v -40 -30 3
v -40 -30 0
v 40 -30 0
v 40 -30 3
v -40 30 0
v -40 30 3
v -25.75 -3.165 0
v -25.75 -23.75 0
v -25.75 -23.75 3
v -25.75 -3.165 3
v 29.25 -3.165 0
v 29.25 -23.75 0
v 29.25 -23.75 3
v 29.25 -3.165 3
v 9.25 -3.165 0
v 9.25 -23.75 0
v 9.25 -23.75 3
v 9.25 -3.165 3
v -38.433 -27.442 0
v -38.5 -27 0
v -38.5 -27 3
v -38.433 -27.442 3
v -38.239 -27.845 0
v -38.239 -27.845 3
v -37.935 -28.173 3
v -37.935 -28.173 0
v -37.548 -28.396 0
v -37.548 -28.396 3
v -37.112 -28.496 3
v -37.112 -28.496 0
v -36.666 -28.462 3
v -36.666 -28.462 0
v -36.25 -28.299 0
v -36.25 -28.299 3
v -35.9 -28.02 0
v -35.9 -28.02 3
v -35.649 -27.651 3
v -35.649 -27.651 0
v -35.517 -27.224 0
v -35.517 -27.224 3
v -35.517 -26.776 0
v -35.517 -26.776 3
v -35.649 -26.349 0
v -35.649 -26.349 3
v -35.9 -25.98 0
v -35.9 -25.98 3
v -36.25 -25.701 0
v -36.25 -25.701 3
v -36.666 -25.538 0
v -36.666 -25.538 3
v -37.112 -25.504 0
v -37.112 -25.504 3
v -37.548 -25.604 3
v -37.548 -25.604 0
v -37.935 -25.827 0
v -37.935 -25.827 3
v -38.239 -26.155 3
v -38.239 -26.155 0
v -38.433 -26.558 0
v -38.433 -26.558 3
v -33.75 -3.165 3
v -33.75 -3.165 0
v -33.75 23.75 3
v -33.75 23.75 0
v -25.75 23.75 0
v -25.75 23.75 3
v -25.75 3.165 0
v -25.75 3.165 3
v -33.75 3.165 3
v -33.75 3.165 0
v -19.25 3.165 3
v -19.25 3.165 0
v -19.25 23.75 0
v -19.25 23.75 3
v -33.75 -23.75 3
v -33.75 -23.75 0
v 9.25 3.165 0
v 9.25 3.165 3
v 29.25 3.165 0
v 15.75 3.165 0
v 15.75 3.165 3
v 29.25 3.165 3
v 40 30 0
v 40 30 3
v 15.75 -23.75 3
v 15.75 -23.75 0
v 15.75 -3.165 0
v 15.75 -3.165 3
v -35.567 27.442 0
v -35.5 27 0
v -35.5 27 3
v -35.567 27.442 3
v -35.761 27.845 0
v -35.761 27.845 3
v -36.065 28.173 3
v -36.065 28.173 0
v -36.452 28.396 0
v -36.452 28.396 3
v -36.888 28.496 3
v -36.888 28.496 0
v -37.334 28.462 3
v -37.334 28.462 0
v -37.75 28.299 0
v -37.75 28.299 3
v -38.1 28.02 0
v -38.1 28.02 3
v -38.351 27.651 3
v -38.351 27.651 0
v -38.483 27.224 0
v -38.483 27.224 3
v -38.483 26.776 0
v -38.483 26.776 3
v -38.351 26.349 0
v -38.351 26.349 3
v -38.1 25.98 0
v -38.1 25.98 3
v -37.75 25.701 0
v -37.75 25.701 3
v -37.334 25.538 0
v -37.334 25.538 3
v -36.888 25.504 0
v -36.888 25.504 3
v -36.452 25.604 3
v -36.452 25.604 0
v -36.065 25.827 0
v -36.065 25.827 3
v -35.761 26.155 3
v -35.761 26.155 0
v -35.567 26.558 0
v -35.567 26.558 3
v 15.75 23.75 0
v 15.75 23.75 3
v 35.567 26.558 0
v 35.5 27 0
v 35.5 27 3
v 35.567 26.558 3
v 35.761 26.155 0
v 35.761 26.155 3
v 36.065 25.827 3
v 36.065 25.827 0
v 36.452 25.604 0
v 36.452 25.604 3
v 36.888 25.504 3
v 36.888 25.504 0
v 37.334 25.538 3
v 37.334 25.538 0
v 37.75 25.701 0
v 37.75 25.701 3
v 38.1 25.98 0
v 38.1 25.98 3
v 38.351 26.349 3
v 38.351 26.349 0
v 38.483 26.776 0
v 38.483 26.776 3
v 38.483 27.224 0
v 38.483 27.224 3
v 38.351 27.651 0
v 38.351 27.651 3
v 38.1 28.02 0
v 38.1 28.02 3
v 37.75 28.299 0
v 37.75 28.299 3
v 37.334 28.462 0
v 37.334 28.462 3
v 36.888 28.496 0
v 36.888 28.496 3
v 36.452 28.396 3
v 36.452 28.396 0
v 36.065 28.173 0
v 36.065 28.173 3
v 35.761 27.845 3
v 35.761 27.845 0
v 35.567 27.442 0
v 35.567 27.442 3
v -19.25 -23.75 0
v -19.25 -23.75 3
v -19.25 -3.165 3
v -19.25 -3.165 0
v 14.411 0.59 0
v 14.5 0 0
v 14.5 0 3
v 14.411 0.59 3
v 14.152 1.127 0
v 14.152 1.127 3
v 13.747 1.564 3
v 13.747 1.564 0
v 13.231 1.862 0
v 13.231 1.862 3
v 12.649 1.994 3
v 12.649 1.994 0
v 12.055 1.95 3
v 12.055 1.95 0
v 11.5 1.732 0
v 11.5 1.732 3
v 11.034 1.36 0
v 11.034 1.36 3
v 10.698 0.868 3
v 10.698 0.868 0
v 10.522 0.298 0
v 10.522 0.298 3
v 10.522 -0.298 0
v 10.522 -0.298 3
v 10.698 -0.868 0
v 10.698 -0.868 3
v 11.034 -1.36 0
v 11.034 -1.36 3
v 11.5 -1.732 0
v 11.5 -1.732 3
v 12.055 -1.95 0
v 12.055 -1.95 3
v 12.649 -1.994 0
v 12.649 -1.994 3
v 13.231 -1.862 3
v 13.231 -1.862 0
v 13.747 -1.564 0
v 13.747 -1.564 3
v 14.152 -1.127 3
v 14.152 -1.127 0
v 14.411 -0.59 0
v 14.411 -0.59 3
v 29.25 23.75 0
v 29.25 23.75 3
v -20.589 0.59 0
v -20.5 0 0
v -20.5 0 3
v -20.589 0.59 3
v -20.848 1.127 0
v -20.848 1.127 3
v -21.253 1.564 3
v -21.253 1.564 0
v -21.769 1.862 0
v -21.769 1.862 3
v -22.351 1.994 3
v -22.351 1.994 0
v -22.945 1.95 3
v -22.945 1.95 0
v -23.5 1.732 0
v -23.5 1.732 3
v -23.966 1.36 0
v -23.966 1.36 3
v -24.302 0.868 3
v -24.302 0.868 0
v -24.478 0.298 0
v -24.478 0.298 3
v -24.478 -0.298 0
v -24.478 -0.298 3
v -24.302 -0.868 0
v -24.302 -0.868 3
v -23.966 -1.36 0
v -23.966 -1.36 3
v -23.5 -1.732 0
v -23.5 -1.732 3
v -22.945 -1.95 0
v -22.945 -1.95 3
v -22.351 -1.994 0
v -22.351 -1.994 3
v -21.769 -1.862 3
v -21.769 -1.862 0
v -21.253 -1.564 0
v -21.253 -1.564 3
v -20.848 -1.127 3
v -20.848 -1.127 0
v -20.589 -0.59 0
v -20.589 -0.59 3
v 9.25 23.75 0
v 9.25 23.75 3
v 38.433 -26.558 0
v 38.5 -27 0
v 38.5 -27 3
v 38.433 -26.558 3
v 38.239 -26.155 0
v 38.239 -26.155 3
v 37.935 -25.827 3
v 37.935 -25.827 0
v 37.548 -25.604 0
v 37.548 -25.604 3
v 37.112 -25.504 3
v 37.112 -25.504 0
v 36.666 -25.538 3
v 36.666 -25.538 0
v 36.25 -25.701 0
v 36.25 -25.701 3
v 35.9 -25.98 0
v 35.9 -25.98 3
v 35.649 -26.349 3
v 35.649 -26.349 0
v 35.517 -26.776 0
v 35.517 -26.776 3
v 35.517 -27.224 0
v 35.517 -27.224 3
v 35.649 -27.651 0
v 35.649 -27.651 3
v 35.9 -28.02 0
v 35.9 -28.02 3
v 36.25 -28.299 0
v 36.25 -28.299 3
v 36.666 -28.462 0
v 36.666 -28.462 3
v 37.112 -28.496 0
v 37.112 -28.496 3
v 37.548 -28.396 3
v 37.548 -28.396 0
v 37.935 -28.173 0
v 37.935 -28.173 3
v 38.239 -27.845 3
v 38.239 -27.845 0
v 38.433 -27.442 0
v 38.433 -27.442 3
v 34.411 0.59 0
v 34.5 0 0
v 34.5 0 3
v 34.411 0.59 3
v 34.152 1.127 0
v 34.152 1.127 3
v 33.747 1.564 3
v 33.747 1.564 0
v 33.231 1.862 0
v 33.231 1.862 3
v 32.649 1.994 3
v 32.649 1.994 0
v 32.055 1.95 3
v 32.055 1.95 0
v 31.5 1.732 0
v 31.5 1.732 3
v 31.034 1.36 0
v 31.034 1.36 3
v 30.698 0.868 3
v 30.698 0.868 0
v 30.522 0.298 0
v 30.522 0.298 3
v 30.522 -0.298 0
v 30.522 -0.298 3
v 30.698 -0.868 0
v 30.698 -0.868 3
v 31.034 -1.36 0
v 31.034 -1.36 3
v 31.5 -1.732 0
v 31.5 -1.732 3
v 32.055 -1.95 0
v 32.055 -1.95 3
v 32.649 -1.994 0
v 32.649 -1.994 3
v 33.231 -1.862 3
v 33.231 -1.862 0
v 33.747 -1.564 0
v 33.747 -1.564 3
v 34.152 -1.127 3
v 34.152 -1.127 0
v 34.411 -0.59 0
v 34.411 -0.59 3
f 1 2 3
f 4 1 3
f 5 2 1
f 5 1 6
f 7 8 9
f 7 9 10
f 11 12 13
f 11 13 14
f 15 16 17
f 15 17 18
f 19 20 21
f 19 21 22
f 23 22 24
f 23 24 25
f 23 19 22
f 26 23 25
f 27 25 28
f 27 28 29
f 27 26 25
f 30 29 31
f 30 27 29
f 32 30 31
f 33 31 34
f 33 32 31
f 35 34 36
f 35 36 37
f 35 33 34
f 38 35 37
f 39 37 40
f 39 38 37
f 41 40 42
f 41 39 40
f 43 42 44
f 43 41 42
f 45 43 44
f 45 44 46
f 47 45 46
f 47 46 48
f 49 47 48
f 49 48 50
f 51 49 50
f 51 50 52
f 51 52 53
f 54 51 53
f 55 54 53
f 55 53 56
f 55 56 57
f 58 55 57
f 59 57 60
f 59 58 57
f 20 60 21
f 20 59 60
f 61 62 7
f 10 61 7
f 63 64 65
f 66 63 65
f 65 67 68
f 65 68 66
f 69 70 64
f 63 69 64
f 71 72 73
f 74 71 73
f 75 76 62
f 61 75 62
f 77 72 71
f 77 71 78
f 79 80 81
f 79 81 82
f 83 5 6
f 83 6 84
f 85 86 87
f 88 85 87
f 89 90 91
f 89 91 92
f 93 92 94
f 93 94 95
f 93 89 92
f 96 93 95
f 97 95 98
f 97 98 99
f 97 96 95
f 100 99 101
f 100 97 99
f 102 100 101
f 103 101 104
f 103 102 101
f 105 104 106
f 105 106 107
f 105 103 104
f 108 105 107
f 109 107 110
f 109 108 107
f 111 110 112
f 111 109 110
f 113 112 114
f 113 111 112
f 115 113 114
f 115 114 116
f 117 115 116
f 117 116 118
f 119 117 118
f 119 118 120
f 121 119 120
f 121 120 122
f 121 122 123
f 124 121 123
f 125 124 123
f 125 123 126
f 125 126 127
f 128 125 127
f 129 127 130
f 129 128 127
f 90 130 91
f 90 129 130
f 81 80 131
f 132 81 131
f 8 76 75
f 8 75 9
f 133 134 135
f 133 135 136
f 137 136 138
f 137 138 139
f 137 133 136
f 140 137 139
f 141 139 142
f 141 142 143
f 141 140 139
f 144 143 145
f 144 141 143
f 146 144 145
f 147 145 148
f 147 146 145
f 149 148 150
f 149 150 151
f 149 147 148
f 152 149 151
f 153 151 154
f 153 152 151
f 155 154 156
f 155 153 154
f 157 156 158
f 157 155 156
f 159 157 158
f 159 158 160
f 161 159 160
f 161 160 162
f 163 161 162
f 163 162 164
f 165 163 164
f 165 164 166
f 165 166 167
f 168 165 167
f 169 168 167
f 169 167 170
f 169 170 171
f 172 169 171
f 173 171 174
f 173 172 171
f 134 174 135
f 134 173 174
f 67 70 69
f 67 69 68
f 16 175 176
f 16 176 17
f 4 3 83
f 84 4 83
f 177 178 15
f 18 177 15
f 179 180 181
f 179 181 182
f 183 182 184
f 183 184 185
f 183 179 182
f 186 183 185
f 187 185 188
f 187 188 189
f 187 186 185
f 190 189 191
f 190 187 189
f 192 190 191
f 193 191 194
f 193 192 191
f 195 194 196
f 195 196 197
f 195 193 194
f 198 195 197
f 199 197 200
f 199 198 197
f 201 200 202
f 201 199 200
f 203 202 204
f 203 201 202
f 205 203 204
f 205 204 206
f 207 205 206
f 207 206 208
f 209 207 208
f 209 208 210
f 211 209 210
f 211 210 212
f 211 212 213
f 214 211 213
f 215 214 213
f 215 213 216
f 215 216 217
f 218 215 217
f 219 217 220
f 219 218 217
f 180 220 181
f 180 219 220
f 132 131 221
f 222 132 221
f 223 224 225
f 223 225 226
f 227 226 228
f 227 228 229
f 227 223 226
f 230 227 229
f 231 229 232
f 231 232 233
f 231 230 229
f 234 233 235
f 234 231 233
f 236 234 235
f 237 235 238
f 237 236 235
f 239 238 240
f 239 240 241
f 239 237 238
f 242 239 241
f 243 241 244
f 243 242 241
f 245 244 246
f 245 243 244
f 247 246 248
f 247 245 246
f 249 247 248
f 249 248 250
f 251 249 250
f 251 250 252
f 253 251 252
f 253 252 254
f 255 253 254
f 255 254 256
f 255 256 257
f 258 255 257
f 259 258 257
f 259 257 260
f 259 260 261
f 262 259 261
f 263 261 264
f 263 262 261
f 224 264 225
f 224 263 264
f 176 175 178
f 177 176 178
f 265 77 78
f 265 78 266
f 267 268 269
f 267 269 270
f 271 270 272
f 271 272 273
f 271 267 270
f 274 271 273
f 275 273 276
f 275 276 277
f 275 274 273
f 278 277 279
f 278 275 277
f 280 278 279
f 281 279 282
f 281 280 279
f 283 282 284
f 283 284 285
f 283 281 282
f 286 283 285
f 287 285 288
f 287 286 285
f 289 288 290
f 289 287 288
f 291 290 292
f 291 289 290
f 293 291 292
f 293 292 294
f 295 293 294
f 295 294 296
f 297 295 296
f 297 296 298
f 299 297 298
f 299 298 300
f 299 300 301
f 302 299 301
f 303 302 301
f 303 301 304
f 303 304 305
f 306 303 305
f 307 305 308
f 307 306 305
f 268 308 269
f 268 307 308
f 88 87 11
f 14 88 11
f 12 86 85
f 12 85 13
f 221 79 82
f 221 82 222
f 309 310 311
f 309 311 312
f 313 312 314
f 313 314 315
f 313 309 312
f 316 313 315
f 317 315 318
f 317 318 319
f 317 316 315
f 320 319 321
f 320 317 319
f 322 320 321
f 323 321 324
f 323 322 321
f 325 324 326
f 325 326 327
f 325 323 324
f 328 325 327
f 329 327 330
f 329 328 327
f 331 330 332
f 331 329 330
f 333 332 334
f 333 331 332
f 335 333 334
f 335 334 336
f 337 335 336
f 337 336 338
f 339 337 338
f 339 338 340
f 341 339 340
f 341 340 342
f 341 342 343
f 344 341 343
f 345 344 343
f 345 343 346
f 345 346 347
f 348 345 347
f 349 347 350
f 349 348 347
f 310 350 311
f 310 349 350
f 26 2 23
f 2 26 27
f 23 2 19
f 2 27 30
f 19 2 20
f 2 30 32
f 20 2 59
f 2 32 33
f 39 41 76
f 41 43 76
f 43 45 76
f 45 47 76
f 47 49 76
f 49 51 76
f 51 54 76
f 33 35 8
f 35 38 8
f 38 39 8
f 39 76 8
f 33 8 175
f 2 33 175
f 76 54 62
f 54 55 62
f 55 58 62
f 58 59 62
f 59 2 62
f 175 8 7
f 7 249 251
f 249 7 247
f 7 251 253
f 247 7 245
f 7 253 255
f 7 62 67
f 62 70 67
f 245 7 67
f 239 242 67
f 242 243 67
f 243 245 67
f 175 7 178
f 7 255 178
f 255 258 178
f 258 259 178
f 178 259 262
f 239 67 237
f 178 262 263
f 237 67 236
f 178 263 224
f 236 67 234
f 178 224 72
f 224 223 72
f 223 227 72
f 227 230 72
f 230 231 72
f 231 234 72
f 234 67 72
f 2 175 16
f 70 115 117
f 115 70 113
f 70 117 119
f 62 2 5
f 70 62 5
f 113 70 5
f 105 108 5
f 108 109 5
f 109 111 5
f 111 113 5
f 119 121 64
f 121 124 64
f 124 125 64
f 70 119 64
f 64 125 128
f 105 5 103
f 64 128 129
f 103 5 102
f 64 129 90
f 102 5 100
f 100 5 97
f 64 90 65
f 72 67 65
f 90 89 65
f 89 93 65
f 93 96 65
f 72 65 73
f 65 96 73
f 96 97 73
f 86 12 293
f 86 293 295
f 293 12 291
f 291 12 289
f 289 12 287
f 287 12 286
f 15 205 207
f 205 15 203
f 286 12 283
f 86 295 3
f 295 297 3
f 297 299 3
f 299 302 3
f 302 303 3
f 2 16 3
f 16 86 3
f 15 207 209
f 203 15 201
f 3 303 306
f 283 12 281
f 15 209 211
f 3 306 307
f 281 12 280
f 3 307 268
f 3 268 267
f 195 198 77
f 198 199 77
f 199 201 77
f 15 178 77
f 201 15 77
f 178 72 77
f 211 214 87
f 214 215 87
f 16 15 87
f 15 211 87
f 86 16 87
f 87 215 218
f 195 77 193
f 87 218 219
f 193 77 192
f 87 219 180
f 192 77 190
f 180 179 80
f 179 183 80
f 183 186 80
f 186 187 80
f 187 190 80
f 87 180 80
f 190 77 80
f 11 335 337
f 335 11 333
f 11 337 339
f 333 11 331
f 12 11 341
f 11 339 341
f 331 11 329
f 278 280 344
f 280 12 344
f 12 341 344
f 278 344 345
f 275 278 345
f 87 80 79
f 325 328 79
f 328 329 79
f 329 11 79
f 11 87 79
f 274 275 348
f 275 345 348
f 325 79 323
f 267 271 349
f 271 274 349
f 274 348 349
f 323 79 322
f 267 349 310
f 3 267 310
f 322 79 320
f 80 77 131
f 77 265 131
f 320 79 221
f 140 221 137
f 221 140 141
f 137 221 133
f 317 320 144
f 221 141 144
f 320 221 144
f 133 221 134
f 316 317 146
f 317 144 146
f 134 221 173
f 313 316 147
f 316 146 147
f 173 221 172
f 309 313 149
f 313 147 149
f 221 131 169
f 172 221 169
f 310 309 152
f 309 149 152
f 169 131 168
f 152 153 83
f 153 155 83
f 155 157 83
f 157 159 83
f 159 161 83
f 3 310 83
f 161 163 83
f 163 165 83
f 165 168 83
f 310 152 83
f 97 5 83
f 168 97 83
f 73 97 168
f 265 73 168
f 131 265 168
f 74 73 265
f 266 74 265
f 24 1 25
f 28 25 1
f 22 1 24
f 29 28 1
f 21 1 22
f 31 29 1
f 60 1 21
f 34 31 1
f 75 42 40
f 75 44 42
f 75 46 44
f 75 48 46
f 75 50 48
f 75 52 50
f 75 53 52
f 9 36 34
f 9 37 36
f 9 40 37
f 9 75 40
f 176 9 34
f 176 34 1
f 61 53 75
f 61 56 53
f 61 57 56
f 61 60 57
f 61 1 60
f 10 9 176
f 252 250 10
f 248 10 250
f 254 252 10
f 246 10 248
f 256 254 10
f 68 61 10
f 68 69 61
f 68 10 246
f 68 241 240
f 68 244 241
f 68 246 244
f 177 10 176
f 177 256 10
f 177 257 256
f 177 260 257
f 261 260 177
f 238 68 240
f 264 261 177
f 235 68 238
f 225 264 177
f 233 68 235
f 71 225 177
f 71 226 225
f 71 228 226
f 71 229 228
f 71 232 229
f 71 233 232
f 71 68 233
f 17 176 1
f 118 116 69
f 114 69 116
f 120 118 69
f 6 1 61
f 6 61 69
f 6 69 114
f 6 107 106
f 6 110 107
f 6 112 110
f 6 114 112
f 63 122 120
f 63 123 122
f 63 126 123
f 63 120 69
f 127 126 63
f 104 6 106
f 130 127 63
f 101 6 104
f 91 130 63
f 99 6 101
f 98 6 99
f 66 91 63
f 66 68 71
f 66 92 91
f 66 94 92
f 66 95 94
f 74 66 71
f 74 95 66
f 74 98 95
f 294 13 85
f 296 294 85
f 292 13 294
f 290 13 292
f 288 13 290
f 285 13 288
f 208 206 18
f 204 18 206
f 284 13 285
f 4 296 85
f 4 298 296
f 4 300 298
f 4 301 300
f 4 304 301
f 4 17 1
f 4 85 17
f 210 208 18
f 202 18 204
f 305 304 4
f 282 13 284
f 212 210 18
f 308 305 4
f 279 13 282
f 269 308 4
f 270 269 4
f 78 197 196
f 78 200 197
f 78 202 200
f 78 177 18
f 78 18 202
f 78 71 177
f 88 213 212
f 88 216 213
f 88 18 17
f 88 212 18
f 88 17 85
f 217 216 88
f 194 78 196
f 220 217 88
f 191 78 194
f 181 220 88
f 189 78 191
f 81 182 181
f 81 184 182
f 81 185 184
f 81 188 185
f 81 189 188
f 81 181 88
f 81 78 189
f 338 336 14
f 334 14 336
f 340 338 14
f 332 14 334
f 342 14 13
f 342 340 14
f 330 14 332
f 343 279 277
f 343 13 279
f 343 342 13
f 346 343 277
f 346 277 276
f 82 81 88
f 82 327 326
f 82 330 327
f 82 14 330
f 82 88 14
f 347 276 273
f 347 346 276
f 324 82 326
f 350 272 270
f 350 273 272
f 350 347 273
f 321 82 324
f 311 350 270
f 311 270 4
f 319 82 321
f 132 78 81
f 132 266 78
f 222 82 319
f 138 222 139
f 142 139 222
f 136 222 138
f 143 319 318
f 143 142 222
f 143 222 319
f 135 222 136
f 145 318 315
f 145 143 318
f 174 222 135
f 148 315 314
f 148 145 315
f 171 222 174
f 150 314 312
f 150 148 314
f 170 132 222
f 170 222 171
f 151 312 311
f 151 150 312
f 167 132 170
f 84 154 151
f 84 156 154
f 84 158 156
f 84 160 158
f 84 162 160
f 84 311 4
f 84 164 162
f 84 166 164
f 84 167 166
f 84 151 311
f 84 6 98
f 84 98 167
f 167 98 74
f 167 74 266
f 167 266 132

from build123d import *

# Parameters (mm, degrees)
SKETCH1_W           = 80
SKETCH1_H           = 60
SKETCH1_R           = 1.5
SKETCH1_R_2         = 2
SKETCH1_W_2         = 13.5
SKETCH1_H_2         = 20.585457955
SKETCH1_W_3         = 28.5
SKETCH1_W_4         = 8
BOSS_EXTRUDE1_DEPTH = 3


with BuildPart() as part:
    # Sketch1 → Boss-Extrude1 (new body)
    with BuildSketch(Plane.XY):
        Rectangle(SKETCH1_W, SKETCH1_H)
        with Locations((-37, 27)):
            Circle(SKETCH1_R, mode=Mode.SUBTRACT)
        with Locations(Location((-37, -27, 0), (0, 0, 180))):
            Circle(SKETCH1_R, mode=Mode.SUBTRACT)
        with Locations((37, -27)):
            Circle(SKETCH1_R, mode=Mode.SUBTRACT)
        with Locations(Location((37, 27, 0), (0, 0, 180))):
            Circle(SKETCH1_R, mode=Mode.SUBTRACT)
        with Locations((32.5, 0)):
            Circle(SKETCH1_R_2, mode=Mode.SUBTRACT)
        with Locations((12.5, 0)):
            Circle(SKETCH1_R_2, mode=Mode.SUBTRACT)
        with Locations((-22.5, 0)):
            Circle(SKETCH1_R_2, mode=Mode.SUBTRACT)
        with Locations((22.5, -13.457271023)):
            Rectangle(SKETCH1_W_2, SKETCH1_H_2, mode=Mode.SUBTRACT)
        with Locations((-5, 13.457271023)):
            Rectangle(SKETCH1_W_3, SKETCH1_H_2, mode=Mode.SUBTRACT)
        with Locations((22.5, 13.457271023)):
            Rectangle(SKETCH1_W_2, SKETCH1_H_2, mode=Mode.SUBTRACT)
        with Locations((-29.75, 13.457271023)):
            Rectangle(SKETCH1_W_4, SKETCH1_H_2, mode=Mode.SUBTRACT)
        with Locations((-5, -13.457271023)):
            Rectangle(SKETCH1_W_3, SKETCH1_H_2, mode=Mode.SUBTRACT)
        with Locations((-29.75, -13.457271023)):
            Rectangle(SKETCH1_W_4, SKETCH1_H_2, mode=Mode.SUBTRACT)
    extrude(amount=BOSS_EXTRUDE1_DEPTH)


solid = part.part
